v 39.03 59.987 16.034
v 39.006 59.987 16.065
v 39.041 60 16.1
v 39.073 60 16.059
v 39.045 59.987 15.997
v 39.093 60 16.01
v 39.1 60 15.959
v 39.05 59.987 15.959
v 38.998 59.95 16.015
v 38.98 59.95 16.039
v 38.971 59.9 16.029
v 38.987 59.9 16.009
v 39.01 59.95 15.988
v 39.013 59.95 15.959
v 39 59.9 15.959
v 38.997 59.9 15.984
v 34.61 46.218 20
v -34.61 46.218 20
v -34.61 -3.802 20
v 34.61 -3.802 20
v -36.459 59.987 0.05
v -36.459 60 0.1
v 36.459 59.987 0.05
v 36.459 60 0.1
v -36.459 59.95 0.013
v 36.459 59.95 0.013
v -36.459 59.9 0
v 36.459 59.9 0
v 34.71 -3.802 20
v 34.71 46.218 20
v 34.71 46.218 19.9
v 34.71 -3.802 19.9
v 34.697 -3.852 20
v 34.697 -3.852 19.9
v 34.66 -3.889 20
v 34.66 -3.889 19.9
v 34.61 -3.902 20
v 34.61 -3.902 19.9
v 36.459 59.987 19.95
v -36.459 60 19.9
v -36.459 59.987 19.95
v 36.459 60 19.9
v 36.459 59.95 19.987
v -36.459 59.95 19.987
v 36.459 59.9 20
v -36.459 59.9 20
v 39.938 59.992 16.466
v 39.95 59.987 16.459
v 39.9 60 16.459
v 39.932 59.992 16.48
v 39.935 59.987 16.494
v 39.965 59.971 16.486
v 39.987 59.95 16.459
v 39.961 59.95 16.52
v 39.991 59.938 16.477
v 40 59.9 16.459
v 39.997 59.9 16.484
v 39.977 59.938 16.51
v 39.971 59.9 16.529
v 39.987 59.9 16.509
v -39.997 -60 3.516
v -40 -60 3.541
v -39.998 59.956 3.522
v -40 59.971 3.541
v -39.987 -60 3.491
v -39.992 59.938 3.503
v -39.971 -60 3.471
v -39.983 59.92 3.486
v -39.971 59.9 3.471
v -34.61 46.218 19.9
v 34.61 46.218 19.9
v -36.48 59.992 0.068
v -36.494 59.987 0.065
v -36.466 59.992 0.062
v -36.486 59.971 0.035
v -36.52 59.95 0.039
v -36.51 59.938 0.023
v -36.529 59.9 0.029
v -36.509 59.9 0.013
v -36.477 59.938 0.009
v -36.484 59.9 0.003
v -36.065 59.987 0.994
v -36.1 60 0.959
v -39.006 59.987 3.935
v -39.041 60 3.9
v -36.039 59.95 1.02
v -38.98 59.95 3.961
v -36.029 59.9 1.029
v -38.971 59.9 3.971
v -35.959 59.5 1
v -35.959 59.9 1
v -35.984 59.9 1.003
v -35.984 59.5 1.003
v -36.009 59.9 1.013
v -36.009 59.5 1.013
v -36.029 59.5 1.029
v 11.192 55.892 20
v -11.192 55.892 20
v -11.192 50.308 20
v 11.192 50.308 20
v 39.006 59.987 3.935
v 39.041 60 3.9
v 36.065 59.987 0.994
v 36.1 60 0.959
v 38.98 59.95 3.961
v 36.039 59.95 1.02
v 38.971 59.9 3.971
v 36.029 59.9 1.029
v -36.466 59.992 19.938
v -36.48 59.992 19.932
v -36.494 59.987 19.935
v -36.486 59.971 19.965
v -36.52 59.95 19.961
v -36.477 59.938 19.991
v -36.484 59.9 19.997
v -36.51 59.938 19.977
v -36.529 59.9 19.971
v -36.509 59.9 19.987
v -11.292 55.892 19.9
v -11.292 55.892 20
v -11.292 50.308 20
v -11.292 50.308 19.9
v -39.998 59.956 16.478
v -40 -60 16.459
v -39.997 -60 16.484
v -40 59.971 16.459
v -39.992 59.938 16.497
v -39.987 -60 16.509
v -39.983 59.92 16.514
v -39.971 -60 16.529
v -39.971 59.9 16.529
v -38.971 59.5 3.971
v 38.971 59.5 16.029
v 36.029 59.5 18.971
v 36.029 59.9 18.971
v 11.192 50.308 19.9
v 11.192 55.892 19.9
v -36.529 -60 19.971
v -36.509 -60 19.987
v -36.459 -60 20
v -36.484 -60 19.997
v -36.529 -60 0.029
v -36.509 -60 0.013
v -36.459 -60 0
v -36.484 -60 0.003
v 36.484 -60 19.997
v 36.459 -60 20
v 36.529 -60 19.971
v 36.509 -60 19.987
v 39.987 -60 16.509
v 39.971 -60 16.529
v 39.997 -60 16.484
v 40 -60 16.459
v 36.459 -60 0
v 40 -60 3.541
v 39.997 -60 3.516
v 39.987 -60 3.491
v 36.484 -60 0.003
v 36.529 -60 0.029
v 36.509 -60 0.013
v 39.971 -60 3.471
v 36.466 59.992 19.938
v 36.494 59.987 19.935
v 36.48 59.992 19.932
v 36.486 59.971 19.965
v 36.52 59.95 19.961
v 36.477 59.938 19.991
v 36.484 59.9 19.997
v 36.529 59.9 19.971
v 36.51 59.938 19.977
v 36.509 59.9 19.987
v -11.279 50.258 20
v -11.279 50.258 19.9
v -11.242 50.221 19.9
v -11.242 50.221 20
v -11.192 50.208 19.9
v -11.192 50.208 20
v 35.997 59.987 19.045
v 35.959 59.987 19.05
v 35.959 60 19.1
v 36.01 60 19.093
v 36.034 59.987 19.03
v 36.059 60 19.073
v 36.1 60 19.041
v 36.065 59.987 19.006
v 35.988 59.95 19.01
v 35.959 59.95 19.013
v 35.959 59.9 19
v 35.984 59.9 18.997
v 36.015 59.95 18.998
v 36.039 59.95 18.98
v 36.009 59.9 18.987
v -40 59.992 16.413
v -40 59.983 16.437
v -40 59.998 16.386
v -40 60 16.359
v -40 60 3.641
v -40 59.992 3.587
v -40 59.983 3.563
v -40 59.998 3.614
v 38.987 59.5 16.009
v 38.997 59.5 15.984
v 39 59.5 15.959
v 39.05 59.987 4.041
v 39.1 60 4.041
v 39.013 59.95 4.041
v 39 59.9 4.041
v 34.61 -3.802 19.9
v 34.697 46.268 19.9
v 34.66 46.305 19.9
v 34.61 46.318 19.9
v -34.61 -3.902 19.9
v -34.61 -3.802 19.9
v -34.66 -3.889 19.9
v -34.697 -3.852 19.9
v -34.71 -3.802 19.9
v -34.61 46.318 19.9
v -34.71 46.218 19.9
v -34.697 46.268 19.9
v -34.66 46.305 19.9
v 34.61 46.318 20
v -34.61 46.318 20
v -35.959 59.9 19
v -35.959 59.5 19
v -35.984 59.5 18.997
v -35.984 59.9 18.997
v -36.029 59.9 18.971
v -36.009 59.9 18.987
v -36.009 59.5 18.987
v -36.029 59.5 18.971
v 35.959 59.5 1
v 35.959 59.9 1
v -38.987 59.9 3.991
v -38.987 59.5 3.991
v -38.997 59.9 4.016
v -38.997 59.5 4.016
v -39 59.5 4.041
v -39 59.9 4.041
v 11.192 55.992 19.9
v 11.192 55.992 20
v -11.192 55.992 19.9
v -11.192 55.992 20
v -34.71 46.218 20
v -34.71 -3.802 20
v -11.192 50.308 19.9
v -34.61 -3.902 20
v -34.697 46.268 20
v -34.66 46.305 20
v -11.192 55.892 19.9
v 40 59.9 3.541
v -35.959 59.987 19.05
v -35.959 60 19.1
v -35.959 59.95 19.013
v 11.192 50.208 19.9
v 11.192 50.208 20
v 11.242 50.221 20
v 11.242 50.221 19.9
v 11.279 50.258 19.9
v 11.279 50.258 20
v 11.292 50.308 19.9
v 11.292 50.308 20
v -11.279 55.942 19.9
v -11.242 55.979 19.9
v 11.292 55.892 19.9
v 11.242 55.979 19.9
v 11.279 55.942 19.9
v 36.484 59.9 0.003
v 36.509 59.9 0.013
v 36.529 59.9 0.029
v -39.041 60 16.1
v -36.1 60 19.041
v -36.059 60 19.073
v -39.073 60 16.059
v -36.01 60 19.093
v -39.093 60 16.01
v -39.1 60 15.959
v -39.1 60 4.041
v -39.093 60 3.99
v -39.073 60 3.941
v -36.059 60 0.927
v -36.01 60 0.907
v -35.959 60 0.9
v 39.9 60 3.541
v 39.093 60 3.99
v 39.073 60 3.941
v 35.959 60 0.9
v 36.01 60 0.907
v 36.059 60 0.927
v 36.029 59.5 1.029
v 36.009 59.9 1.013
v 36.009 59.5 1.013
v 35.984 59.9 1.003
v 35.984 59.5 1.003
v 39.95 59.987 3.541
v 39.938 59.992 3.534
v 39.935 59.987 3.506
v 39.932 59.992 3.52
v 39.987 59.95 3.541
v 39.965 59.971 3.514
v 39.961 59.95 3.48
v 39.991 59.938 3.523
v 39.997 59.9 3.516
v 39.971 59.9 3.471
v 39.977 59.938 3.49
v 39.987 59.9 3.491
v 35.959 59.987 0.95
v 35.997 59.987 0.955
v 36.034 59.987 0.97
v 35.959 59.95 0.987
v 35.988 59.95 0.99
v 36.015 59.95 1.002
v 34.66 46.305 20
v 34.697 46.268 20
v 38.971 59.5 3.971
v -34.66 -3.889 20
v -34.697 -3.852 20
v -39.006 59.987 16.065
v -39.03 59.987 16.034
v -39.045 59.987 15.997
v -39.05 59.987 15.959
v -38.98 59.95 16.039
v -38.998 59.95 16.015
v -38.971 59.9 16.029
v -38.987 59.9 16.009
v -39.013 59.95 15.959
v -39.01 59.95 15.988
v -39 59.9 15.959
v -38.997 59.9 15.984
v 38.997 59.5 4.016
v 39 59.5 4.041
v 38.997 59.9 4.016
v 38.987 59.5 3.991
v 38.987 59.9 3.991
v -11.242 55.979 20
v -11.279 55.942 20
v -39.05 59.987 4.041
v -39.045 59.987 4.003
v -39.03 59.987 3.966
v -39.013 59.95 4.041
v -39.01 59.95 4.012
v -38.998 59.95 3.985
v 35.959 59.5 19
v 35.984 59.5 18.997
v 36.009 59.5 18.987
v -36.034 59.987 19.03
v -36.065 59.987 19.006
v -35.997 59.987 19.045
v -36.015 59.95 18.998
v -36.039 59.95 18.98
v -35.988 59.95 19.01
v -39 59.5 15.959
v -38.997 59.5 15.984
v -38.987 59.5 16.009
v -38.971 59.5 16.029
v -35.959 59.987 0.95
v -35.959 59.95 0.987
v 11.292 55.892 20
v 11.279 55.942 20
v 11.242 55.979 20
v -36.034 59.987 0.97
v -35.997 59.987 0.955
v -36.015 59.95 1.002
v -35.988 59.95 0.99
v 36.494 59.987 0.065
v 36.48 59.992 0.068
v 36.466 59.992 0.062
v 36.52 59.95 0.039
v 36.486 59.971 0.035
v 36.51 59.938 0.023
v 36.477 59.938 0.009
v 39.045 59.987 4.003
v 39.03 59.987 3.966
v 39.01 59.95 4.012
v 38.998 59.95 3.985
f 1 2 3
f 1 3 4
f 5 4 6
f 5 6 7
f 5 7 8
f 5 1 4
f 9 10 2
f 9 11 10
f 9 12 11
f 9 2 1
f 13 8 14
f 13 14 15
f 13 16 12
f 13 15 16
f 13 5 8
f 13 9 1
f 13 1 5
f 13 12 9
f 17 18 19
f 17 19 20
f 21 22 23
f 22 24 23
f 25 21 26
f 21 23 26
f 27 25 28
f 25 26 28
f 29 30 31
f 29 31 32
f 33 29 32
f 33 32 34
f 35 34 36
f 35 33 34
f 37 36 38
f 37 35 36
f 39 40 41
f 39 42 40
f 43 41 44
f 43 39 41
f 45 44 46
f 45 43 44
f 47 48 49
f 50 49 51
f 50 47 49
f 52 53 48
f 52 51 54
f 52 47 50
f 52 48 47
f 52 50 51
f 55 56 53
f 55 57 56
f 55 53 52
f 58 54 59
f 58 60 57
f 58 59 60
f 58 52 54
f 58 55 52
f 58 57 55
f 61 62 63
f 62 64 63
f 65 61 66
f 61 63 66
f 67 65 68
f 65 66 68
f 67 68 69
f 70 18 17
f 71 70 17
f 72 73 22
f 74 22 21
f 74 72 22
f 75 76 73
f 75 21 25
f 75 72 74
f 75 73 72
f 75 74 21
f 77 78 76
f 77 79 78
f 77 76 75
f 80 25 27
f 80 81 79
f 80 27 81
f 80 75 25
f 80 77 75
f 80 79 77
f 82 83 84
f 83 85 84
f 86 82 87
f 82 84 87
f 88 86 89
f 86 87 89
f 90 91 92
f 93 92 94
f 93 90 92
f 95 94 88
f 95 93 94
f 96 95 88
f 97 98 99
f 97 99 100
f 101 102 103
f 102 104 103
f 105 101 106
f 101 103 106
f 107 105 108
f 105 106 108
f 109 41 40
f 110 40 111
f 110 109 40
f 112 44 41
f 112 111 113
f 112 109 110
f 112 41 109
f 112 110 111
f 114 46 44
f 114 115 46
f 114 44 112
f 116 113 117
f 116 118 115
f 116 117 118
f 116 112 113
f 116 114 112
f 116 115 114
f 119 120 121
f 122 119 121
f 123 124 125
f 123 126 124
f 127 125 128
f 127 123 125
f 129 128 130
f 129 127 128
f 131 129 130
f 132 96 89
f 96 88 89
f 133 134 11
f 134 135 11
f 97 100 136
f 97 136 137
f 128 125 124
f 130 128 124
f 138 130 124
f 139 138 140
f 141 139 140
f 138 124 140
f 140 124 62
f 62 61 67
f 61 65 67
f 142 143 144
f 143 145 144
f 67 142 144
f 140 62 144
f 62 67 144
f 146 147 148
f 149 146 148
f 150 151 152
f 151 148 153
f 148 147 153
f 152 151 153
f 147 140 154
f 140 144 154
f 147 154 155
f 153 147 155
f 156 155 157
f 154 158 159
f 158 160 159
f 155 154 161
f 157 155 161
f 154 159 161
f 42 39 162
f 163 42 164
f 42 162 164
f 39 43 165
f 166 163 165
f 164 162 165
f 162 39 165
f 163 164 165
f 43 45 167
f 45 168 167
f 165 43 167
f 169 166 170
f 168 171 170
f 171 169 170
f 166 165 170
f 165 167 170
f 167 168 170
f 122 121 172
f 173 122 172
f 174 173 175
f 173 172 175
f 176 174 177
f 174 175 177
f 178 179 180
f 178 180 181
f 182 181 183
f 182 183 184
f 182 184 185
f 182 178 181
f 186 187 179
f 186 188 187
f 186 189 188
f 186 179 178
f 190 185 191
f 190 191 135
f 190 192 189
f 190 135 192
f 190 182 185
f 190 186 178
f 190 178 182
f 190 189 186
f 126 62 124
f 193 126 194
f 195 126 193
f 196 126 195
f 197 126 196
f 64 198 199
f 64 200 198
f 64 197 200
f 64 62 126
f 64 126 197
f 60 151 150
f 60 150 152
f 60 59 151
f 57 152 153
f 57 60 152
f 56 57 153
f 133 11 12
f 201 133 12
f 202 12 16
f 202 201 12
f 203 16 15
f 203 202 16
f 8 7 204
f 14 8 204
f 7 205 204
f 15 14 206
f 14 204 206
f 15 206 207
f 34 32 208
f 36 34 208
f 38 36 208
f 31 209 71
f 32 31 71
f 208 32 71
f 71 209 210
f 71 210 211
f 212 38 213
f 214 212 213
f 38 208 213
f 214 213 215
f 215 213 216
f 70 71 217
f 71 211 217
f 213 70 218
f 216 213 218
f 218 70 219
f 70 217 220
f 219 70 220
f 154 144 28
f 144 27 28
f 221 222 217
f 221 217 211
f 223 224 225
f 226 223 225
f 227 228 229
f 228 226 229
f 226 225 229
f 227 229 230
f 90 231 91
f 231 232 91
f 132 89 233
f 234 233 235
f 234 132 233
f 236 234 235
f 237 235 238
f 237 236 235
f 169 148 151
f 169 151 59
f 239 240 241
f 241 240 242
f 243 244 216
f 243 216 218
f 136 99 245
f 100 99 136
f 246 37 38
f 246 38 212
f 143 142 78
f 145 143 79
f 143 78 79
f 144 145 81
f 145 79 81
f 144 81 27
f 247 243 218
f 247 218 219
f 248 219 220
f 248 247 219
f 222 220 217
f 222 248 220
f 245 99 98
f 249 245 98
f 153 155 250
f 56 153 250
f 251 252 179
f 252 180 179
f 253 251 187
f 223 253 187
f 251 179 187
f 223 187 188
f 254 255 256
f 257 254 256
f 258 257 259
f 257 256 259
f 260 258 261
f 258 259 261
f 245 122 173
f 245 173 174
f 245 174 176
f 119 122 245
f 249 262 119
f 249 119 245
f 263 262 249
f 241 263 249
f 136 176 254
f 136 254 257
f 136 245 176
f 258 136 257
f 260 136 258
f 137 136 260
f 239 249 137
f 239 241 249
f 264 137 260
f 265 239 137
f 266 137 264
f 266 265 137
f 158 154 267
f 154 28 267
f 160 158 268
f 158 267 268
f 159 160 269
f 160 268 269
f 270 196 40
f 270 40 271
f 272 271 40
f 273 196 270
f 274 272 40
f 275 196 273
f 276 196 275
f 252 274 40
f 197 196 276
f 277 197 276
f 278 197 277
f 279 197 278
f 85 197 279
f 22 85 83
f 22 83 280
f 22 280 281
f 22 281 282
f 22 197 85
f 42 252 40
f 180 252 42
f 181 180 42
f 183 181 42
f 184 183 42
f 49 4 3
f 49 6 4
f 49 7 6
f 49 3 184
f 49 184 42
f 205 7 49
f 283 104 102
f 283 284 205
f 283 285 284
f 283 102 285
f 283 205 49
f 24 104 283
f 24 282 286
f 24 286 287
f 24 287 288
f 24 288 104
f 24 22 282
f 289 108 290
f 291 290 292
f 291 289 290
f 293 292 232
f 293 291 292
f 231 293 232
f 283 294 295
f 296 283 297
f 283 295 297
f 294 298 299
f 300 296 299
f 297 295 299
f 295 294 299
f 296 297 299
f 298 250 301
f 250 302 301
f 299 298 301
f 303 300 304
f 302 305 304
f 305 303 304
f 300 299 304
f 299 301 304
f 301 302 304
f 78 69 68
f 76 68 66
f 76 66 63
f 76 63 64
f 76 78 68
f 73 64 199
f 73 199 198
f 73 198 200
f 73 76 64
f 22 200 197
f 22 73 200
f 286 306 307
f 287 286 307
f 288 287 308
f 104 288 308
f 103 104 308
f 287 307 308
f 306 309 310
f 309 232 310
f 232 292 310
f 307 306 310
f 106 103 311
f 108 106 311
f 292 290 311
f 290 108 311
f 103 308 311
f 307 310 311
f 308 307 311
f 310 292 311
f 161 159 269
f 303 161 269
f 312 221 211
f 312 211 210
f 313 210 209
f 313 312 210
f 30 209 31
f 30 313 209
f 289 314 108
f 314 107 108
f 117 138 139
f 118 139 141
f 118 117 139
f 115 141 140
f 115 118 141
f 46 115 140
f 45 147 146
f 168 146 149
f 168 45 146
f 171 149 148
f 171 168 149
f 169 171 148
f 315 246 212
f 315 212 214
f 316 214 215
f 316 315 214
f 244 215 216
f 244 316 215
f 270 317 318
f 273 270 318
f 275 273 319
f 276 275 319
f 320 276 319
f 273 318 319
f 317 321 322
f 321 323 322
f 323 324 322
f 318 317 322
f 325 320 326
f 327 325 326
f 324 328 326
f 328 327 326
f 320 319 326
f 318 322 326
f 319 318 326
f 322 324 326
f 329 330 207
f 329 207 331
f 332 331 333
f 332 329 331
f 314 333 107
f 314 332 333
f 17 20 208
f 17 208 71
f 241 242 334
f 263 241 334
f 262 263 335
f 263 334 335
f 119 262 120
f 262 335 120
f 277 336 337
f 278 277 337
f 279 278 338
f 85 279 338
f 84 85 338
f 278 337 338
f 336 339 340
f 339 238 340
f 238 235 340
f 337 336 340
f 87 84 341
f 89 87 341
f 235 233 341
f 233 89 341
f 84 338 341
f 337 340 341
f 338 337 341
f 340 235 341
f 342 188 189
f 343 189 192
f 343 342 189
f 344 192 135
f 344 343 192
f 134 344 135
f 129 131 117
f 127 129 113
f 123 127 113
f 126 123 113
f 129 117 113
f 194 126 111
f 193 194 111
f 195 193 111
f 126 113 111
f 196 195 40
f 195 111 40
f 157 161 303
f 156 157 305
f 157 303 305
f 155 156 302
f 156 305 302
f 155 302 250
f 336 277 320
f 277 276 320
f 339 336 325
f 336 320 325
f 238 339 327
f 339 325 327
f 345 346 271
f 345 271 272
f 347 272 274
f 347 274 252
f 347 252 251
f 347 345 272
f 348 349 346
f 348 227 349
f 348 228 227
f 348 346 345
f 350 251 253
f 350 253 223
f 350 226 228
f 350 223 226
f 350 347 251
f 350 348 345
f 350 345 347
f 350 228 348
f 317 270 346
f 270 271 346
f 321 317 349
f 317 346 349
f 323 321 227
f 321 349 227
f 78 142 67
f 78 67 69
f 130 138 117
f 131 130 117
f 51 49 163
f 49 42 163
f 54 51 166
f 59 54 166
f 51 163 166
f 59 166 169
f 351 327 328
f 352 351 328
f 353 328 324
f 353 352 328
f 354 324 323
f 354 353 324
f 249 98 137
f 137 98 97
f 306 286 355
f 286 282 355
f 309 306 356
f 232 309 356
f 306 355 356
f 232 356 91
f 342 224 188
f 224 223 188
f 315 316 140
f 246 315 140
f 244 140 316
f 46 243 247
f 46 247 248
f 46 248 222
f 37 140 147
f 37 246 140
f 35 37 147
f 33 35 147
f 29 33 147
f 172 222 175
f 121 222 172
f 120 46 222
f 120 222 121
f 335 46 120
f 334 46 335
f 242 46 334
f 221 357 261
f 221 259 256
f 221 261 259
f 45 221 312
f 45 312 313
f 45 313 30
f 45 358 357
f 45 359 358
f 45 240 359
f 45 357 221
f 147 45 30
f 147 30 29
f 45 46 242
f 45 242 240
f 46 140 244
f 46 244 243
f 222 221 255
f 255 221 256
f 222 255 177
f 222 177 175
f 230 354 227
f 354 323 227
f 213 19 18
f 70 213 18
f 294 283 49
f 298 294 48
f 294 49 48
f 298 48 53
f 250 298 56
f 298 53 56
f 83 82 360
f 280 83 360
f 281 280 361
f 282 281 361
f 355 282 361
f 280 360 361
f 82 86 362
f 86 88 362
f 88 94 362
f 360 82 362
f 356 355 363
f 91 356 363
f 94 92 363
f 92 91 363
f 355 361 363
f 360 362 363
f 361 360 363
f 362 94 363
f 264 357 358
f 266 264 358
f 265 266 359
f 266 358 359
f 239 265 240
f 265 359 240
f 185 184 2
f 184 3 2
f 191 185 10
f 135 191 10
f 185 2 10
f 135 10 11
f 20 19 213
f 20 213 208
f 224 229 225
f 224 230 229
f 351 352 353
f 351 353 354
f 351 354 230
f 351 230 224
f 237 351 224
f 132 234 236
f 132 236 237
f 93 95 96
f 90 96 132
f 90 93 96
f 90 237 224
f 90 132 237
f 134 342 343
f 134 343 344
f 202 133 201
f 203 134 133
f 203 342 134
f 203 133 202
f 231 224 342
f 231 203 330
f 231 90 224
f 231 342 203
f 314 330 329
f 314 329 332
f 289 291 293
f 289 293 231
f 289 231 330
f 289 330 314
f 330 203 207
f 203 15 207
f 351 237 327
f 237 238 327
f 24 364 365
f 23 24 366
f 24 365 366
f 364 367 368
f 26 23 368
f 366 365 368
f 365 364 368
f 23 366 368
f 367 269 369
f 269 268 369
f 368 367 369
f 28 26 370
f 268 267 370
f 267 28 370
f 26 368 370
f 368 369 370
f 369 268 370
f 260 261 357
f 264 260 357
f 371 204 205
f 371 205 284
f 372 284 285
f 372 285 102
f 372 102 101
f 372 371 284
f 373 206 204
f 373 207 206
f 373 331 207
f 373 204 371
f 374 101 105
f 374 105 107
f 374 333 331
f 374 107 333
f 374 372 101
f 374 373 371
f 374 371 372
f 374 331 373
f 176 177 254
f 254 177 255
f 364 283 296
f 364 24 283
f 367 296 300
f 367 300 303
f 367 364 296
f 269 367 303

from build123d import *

# Parameters (mm, degrees)
SKETCH2_W           = 80
SKETCH2_H           = 120
BOSS_EXTRUDE1_DEPTH = 20
CHAMFER1_SIZE       = 3.5
CUT_EXTRUDE1_DEPTH  = 0.5
FILLET1_R           = 0.1
SKETCH4_W           = 22.384
SKETCH4_H           = 5.584
CUT_EXTRUDE2_DEPTH  = 0.1
SKETCH6_W           = 69.22
SKETCH6_H           = 50.02
CUT_EXTRUDE4_DEPTH  = 0.1


with BuildPart() as part:
    # Sketch2 → Boss-Extrude1 (new body)
    with BuildSketch(Plane.XY):
        Rectangle(SKETCH2_W, SKETCH2_H)
    extrude(amount=BOSS_EXTRUDE1_DEPTH)

    # Chamfer1
    chamfer1_edges = [part.edges().sort_by_distance(p)[0] for p in [
        (-40, 0, 20),
        (40, 0, 20),
        (-40, 0, 0),
        (40, 0, 0),
    ]]
    chamfer(chamfer1_edges, length=CHAMFER1_SIZE)

    # Sketch3 → Cut-Extrude1 (cut)
    with BuildSketch(Plane(origin=(0, 60, 0), x_dir=(1, 0, 0), z_dir=(0, 1, 0))):
        Polygon((-36, -19), (36, -19), (39, -16), (39, -4), (36, -1), (-36, -1), (-39, -4), (-39, -16), align=None)
    extrude(amount=-CUT_EXTRUDE1_DEPTH, mode=Mode.SUBTRACT)

    # Fillet1
    fillet1_edges = [part.edges().sort_by_distance(p)[0] for p in [
        (-40, 0, 16.5),
        (-40, 0, 3.5),
        (0, 60, 0),
        (36.5, 0, 0),
        (-36.5, 0, 0),
        (0, 60, 20),
        (40, 60, 10),
        (38.25, 60, 1.75),
        (38.25, 60, 18.25),
        (-38.25, 60, 18.25),
        (-38.25, 60, 1.75),
        (36.5, 0, 20),
        (-36.5, 0, 20),
        (40, 0, 3.5),
        (40, 0, 16.5),
        (-37.5, 60, 2.5),
        (-39, 59.75, 4),
        (0, 60, 1),
        (-36, 59.75, 1),
        (37.5, 60, 2.5),
        (36, 59.75, 1),
        (39, 59.75, 4),
        (39, 59.75, 16),
        (36, 59.75, 19),
        (-36, 59.75, 19),
        (-39, 60, 10),
        (-39, 59.75, 16),
        (-37.5, 60, 17.5),
        (0, 60, 19),
        (37.5, 60, 17.5),
        (39, 60, 10),
    ]]
    fillet(fillet1_edges, radius=FILLET1_R)

    # Sketch4 → Cut-Extrude2 (cut)
    with BuildSketch(Plane.XY.offset(20)):
        with BuildLine():
            Line((-11.192, 50.208), (11.192, 50.208))
            ThreePointArc((11.192, 50.208), (11.262710678, 50.237289322), (11.292, 50.308))
            Line((11.292, 50.308), (11.292, 55.892))
            ThreePointArc((11.292, 55.892), (11.262710678, 55.962710678), (11.192, 55.992))
            Line((11.192, 55.992), (-11.192, 55.992))
            ThreePointArc((-11.192, 55.992), (-11.262710678, 55.962710678), (-11.292, 55.892))
            Line((-11.292, 55.892), (-11.292, 50.308))
            ThreePointArc((-11.292, 50.308), (-11.262710678, 50.237289322), (-11.192, 50.208))
        make_face()
        with Locations((0, 53.1)):
            Rectangle(SKETCH4_W, SKETCH4_H, mode=Mode.SUBTRACT)
    extrude(amount=-CUT_EXTRUDE2_DEPTH, mode=Mode.SUBTRACT)

    # Sketch6 → Cut-Extrude4 (cut)
    with BuildSketch(Plane.XY.offset(20)):
        with BuildLine():
            ThreePointArc((-34.71, 46.218), (-34.680710678, 46.288710678), (-34.61, 46.318))
            Line((-34.61, 46.318), (34.61, 46.318))
            ThreePointArc((34.61, 46.318), (34.680710678, 46.288710678), (34.71, 46.218))
            Line((34.71, 46.218), (34.71, -3.802))
            ThreePointArc((34.71, -3.802), (34.680710678, -3.872710678), (34.61, -3.902))
            Line((34.61, -3.902), (-34.61, -3.902))
            ThreePointArc((-34.61, -3.902), (-34.680710678, -3.872710678), (-34.71, -3.802))
            Line((-34.71, -3.802), (-34.71, 46.218))
        make_face()
        with Locations((0, 21.208)):
            Rectangle(SKETCH6_W, SKETCH6_H, mode=Mode.SUBTRACT)
    extrude(amount=-CUT_EXTRUDE4_DEPTH, mode=Mode.SUBTRACT)


solid = part.part
